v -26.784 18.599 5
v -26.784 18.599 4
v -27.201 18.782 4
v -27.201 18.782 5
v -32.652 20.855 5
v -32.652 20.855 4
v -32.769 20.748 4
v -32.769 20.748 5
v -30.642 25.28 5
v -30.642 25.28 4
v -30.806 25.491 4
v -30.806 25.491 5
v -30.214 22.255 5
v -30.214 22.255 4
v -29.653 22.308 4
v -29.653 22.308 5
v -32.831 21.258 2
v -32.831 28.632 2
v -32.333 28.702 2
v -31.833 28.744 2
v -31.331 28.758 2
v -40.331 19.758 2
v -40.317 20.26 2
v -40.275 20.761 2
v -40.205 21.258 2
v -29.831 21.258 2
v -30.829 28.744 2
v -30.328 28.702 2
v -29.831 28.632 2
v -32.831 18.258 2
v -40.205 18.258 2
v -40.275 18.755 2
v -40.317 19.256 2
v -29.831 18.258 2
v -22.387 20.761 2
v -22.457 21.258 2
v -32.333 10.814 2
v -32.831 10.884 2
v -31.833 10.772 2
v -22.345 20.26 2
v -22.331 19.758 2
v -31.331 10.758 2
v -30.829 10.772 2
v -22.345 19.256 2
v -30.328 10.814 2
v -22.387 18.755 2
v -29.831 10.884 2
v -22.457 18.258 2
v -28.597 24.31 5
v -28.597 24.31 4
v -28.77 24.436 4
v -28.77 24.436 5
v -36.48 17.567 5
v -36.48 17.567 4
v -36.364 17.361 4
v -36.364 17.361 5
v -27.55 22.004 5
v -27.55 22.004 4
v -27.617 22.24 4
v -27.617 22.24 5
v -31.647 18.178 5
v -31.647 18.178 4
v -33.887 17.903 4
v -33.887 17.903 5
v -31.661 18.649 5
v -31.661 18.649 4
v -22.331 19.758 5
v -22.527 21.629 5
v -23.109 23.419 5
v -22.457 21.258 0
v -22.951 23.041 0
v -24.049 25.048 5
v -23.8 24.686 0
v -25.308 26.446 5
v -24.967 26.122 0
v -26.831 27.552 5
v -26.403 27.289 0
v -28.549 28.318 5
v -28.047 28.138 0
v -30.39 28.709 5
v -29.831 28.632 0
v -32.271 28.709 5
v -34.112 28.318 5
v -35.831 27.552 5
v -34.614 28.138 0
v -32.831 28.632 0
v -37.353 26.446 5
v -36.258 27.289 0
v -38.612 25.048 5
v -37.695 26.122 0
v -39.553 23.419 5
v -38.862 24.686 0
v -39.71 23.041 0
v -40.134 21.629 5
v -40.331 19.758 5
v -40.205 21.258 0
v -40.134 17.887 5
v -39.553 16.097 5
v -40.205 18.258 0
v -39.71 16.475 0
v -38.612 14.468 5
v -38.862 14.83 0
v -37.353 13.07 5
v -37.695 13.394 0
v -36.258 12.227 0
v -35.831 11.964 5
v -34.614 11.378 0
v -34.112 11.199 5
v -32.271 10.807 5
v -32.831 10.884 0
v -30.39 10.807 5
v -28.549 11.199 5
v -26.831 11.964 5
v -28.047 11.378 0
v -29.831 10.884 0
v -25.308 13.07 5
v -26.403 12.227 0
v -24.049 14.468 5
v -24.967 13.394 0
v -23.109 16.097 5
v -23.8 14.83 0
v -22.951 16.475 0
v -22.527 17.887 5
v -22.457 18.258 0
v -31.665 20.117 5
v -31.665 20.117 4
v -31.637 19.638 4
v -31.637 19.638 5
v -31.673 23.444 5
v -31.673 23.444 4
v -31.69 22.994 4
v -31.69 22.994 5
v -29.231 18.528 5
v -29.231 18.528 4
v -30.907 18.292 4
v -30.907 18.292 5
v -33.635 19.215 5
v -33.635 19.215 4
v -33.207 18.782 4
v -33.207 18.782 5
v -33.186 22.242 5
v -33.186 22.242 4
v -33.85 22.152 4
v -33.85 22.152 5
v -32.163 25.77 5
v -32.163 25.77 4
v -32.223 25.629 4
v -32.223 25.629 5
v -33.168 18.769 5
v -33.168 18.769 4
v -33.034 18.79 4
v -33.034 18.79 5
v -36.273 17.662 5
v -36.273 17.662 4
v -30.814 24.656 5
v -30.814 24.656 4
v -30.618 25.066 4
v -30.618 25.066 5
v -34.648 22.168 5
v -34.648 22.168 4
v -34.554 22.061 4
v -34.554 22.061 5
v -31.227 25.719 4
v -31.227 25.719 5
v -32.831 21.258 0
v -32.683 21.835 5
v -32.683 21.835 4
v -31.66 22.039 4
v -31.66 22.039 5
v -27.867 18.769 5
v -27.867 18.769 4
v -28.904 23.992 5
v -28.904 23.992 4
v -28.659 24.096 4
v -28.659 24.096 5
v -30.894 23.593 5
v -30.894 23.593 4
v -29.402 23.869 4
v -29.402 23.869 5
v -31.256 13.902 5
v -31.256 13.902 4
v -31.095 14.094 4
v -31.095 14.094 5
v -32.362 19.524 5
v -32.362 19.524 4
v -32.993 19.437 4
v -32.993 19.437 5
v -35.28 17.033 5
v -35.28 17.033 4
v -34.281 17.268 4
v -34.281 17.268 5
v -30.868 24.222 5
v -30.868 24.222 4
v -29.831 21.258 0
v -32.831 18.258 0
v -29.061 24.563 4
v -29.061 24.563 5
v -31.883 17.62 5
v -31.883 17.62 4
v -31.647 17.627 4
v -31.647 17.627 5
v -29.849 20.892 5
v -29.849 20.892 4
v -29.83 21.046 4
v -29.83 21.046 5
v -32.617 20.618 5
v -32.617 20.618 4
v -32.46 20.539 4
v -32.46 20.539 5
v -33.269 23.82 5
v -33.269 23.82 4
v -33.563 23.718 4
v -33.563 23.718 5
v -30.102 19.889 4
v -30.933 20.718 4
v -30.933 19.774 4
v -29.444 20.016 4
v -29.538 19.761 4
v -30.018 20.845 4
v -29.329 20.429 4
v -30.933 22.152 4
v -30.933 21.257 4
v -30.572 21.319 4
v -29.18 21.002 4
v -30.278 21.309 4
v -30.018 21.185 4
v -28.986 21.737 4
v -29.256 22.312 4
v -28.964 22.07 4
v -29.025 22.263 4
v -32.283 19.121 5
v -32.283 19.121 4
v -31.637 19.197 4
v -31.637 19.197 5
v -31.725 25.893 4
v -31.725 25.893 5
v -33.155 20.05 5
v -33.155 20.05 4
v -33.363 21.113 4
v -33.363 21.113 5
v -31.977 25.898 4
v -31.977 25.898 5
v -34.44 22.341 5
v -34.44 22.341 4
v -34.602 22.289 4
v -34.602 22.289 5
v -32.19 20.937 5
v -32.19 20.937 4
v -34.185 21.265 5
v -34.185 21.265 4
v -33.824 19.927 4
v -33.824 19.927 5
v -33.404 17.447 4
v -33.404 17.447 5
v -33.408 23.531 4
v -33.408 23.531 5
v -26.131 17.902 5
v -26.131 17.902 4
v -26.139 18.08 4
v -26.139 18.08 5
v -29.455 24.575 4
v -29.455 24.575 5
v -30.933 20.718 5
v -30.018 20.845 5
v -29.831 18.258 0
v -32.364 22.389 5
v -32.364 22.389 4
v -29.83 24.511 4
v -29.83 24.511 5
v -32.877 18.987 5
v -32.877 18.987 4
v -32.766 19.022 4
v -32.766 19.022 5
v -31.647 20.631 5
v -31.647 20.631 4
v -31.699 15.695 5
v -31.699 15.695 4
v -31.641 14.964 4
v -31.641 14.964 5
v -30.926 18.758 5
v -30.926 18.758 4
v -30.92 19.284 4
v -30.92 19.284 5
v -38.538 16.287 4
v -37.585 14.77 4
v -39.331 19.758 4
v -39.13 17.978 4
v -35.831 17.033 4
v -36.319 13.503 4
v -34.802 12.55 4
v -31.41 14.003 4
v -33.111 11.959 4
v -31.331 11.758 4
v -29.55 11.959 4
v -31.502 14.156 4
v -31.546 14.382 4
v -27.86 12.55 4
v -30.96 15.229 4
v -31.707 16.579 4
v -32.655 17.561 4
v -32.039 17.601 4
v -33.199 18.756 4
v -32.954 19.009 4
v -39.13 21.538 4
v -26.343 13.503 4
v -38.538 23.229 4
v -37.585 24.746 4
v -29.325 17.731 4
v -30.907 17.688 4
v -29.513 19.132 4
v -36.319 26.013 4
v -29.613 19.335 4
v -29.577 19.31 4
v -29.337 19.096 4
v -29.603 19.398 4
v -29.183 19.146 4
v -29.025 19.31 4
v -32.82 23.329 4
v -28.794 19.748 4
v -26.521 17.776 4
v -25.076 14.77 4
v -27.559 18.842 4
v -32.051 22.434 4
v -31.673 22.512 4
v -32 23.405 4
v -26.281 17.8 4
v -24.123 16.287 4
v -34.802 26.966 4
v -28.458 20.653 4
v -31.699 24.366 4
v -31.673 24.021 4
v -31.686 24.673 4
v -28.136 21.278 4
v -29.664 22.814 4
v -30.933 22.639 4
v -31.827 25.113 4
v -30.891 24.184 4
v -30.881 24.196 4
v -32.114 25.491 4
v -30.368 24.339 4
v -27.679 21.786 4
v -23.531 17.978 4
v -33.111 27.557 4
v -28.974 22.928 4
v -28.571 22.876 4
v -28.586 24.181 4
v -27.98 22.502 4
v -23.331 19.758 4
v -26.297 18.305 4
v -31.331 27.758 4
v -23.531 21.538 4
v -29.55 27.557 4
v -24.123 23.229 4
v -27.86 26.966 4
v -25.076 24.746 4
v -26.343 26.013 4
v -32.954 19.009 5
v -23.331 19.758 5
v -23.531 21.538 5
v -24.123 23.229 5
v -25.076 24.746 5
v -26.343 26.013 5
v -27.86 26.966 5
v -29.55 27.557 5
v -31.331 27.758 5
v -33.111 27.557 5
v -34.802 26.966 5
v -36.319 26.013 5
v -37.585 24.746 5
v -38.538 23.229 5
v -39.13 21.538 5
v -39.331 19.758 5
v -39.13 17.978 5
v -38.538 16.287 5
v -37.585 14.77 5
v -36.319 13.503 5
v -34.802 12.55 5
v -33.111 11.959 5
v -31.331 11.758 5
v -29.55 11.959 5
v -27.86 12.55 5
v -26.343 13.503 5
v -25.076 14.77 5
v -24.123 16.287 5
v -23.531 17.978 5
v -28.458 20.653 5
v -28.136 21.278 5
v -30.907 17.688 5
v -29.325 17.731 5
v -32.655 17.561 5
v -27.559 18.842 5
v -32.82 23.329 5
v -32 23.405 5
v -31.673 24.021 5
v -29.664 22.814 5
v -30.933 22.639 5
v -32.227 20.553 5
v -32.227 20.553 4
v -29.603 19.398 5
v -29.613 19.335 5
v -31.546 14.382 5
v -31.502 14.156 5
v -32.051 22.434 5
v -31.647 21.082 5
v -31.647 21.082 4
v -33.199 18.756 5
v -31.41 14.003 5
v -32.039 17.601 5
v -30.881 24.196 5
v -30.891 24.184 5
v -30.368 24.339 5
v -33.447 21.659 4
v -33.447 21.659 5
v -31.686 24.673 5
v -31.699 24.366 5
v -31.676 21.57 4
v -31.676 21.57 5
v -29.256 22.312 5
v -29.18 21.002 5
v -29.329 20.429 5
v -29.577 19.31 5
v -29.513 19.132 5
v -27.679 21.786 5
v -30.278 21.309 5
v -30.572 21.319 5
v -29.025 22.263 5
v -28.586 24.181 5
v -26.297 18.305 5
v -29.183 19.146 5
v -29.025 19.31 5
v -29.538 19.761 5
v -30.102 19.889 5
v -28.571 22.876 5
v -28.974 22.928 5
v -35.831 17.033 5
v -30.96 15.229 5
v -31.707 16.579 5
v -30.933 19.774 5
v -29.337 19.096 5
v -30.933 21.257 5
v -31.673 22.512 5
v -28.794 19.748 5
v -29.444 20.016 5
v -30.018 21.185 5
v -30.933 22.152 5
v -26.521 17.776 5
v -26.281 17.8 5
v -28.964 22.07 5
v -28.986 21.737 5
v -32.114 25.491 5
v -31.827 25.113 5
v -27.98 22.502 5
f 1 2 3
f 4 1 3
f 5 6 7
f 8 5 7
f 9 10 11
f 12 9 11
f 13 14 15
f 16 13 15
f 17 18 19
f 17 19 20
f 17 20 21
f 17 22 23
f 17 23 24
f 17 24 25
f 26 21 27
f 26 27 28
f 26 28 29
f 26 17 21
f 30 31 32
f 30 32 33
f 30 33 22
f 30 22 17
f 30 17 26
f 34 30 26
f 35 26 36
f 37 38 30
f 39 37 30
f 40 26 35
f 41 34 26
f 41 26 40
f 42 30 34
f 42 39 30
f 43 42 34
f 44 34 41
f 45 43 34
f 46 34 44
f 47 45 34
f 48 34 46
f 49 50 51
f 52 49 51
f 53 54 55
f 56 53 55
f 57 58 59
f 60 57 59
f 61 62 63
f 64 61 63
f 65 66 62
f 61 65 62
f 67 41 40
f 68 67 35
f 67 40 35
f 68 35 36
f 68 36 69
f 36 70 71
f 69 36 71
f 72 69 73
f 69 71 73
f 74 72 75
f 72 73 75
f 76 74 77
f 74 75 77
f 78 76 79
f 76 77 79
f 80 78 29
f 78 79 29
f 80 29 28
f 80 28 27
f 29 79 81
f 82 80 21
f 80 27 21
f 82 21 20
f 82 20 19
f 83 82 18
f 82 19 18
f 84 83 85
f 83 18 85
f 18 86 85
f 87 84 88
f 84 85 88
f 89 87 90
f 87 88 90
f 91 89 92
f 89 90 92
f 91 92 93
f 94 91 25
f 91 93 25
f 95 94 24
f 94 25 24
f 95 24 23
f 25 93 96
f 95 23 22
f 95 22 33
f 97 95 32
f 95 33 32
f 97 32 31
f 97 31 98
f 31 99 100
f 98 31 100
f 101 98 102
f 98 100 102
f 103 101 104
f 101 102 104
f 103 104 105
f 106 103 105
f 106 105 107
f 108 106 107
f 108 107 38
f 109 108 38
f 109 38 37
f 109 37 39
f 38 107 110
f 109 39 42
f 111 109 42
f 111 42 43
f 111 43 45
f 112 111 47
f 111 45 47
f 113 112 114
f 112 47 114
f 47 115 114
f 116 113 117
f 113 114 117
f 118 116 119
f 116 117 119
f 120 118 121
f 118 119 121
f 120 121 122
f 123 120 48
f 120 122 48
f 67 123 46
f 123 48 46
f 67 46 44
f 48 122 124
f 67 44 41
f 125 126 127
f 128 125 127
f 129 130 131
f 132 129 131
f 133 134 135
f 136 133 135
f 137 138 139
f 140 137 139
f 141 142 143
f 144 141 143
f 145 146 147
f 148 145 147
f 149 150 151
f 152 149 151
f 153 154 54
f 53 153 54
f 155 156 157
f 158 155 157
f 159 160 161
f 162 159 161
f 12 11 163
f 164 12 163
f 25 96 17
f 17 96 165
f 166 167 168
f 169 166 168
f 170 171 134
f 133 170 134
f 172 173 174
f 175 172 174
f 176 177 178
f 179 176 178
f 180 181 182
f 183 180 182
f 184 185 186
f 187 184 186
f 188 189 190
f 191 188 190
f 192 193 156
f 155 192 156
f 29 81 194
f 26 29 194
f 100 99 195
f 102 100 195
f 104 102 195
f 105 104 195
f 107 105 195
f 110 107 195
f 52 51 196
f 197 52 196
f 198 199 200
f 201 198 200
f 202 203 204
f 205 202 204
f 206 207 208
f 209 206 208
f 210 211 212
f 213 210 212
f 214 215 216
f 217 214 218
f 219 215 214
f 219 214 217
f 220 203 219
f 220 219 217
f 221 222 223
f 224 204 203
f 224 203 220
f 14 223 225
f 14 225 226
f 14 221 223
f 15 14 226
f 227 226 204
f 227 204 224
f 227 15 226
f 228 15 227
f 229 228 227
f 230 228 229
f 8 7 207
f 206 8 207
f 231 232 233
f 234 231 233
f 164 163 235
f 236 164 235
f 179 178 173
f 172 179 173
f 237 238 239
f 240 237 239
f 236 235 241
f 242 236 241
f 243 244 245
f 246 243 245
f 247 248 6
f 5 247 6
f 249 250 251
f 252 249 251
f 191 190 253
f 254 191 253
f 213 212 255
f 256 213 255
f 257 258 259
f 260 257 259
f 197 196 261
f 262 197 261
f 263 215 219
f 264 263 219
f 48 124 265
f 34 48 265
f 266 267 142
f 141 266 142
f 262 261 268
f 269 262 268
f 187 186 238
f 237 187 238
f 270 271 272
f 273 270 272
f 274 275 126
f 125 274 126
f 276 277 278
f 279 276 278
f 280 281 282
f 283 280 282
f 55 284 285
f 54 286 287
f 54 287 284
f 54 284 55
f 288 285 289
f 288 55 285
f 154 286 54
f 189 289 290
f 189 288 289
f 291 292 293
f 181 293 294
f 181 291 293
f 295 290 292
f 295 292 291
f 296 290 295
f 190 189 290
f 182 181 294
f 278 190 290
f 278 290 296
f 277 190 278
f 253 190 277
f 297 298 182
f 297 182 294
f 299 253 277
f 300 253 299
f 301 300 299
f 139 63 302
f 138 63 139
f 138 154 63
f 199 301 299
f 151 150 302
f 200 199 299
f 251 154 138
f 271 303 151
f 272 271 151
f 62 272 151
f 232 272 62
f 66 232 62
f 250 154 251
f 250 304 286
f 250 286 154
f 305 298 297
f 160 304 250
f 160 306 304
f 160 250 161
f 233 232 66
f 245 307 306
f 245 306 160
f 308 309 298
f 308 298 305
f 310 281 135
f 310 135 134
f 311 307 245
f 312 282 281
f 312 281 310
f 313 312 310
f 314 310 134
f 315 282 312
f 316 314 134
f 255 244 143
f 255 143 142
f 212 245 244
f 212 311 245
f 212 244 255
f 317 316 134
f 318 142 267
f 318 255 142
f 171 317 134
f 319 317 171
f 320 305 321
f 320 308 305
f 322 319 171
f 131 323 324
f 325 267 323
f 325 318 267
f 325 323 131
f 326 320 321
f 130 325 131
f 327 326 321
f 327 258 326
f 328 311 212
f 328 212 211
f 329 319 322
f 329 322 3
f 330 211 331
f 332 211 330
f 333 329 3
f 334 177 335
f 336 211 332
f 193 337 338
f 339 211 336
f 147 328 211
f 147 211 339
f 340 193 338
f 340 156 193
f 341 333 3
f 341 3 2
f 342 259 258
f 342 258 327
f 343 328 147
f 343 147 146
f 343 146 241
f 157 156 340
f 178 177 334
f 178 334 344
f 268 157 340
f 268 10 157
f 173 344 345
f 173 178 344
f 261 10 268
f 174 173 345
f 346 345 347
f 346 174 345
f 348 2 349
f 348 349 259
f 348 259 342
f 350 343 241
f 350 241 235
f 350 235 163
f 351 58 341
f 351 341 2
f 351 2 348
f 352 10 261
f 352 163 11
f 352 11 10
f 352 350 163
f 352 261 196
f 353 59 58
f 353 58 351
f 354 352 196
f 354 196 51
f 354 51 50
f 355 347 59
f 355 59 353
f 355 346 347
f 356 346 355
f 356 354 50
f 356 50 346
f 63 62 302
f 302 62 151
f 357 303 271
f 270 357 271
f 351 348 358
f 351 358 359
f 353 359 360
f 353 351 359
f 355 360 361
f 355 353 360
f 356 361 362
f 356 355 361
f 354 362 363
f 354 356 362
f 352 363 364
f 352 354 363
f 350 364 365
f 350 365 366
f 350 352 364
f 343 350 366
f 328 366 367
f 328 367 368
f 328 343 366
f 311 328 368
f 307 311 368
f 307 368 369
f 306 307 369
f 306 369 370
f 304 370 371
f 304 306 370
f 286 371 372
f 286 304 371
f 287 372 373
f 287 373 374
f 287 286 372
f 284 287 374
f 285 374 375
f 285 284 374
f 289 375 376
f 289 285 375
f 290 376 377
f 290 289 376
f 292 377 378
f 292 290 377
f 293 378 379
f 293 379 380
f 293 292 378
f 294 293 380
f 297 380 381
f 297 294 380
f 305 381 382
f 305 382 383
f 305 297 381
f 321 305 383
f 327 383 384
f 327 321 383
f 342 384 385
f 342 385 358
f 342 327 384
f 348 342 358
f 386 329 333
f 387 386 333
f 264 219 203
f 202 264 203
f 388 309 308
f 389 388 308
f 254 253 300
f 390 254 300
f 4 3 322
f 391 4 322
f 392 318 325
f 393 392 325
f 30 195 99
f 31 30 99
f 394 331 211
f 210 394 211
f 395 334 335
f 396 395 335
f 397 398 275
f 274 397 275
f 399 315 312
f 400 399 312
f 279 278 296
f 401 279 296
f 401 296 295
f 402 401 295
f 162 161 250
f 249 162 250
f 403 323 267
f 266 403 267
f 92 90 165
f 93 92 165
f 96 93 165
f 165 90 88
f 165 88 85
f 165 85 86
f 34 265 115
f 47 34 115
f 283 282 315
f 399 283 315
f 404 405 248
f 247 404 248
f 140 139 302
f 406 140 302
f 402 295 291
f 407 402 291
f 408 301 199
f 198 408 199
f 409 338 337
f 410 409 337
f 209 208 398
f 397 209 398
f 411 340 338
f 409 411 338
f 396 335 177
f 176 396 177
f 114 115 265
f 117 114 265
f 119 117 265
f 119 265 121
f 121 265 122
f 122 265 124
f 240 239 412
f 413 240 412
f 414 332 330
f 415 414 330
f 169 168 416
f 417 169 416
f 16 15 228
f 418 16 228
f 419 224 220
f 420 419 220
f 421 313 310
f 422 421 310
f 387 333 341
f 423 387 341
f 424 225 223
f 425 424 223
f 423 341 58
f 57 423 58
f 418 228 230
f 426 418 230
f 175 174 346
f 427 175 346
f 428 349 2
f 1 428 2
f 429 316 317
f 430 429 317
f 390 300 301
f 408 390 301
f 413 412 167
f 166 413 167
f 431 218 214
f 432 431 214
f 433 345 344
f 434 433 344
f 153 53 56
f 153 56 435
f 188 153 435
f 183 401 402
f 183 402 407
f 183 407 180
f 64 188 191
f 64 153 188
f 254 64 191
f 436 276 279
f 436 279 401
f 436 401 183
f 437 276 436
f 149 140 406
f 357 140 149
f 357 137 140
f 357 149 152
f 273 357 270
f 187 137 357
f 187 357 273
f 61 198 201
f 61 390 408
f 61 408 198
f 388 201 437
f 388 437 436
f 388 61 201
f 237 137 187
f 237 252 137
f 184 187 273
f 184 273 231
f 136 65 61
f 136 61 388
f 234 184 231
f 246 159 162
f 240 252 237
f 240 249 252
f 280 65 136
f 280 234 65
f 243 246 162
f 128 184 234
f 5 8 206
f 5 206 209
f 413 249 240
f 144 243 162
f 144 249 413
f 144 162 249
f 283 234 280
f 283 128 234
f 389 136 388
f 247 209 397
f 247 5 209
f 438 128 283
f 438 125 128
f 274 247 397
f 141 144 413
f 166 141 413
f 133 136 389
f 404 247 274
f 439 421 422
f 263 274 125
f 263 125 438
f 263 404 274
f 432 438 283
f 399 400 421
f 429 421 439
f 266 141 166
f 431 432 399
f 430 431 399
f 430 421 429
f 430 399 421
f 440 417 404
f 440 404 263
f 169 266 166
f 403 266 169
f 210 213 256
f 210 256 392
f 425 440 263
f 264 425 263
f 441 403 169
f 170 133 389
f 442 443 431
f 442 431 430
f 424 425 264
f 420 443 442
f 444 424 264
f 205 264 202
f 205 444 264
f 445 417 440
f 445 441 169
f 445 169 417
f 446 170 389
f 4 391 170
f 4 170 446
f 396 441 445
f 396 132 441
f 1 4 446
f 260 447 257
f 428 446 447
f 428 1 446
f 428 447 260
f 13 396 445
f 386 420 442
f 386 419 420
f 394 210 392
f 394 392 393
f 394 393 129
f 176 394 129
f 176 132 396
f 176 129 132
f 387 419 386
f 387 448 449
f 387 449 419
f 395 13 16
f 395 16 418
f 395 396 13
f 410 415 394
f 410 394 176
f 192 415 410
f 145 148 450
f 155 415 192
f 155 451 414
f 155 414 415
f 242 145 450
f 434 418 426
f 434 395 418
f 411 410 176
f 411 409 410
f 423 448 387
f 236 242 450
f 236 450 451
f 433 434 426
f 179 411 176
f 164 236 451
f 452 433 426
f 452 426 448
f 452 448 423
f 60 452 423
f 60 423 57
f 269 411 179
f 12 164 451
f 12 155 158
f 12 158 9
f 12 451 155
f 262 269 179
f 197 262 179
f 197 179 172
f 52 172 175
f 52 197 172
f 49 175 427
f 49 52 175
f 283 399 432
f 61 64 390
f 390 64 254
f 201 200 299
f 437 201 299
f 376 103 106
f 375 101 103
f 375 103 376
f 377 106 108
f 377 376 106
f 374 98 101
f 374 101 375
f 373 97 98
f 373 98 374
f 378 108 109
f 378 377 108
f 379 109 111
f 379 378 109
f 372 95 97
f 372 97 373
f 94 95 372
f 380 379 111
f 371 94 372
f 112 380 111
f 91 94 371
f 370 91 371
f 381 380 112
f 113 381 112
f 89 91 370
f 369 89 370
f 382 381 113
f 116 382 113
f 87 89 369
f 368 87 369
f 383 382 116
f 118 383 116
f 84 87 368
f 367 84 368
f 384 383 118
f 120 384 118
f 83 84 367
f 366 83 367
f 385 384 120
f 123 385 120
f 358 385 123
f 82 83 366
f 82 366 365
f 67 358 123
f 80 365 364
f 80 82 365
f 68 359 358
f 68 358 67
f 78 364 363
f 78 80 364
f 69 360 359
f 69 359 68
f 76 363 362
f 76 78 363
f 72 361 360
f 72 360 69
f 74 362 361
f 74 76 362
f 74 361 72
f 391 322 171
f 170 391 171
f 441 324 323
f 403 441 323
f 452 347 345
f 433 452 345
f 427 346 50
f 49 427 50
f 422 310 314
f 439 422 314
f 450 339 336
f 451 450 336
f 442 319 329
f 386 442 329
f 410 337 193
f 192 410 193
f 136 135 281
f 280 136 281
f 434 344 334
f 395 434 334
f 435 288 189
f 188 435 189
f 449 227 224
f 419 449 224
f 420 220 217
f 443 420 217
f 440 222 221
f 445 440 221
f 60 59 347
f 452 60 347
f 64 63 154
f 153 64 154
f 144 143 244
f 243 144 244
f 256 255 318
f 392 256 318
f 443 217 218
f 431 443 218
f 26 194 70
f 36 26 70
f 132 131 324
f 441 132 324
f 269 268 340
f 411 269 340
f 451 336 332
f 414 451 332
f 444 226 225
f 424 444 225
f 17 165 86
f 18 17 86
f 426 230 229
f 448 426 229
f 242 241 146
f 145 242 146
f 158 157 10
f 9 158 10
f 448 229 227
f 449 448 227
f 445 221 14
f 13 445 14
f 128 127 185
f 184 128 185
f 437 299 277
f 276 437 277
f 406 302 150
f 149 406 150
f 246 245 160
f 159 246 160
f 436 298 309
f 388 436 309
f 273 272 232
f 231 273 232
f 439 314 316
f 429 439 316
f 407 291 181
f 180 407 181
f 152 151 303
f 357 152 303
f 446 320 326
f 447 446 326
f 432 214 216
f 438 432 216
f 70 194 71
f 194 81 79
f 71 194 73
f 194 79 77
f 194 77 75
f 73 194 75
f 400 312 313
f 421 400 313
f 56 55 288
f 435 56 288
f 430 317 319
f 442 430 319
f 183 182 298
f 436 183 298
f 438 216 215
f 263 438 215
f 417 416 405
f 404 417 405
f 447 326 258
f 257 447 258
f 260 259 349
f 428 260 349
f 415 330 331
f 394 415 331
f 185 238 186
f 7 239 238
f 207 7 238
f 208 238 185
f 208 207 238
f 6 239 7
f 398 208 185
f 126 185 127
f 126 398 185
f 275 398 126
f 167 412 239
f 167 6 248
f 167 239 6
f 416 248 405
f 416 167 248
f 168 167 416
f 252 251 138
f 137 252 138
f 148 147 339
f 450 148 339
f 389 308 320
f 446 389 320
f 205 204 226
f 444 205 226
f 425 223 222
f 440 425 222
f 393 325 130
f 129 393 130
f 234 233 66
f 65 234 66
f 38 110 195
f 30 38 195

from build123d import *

# Parameters (mm, degrees)
F0_R     = 9
F1_DEPTH = 4
F3_W     = 3
F3_H     = 3
F4_DEPTH = 2
F2_R     = 9
F2_R_2   = 8
F5_DEPTH = 1
F7_DEPTH = 1


# Not quite as in the source:
# - a feature names something its author has since deleted; it is built from what else it names


with BuildPart() as f1:
    # F0 (on Top) → F1 (new body)
    with BuildSketch(Plane.XY):
        with Locations((-31.3306450844, 19.7580661625)):
            Circle(F0_R)
    extrude(amount=F1_DEPTH)

    # F3 (on face) → F4 (cut)
    with BuildSketch(Plane(origin=(0, 0, 0), x_dir=(1, 0, 0), z_dir=(0, 0, -1))):
        with BuildLine():
            ThreePointArc((-32.8306450844, -28.6321858371), (-32.0832814269, -28.7265408676), (-31.3306450844, -28.7580661625))
            ThreePointArc((-31.3306450844, -28.7580661625), (-30.5780087419, -28.7265408676), (-29.8306450844, -28.6321858371))
            Line((-29.8306450844, -28.6321858371), (-29.8306450844, -21.2580661625))
            Line((-29.8306450844, -21.2580661625), (-32.8306450844, -21.2580661625))
            Line((-32.8306450844, -21.2580661625), (-32.8306450844, -28.6321858371))
        make_face()
        with BuildLine():
            ThreePointArc((-40.204764759, -18.2580661625), (-40.2991197895, -19.0054298199), (-40.3306450844, -19.7580661625))
            ThreePointArc((-40.3306450844, -19.7580661625), (-40.2991197895, -20.510702505), (-40.204764759, -21.2580661625))
            Line((-40.204764759, -21.2580661625), (-32.8306450844, -21.2580661625))
            Line((-32.8306450844, -21.2580661625), (-32.8306450844, -18.2580661625))
            Line((-32.8306450844, -18.2580661625), (-40.204764759, -18.2580661625))
        make_face()
        with Locations((-31.3306450844, -19.7580661625)):
            Rectangle(F3_W, F3_H)
        with BuildLine():
            Line((-29.8306450844, -18.2580661625), (-29.8306450844, -21.2580661625))
            Line((-29.8306450844, -21.2580661625), (-22.4565254097, -21.2580661625))
            ThreePointArc((-22.4565254097, -21.2580661625), (-22.3621703793, -20.510702505), (-22.3306450844, -19.7580661625))
            ThreePointArc((-22.3306450844, -19.7580661625), (-22.3621703793, -19.0054298199), (-22.4565254097, -18.2580661625))
            Line((-22.4565254097, -18.2580661625), (-29.8306450844, -18.2580661625))
        make_face()
        with BuildLine():
            Line((-32.8306450844, -10.8839464878), (-32.8306450844, -18.2580661625))
            Line((-32.8306450844, -18.2580661625), (-29.8306450844, -18.2580661625))
            Line((-29.8306450844, -18.2580661625), (-29.8306450844, -10.8839464878))
            ThreePointArc((-29.8306450844, -10.8839464878), (-30.5780087419, -10.7895914574), (-31.3306450844, -10.7580661625))
            ThreePointArc((-31.3306450844, -10.7580661625), (-32.0832814269, -10.7895914574), (-32.8306450844, -10.8839464878))
        make_face()
    extrude(amount=-F4_DEPTH, mode=Mode.SUBTRACT)

    # F2 (on face) → F5 (join)
    with BuildSketch(Plane.XY.offset(4)):
        with Locations((-31.3306450844, 19.7580661625)):
            Circle(F2_R)
        with Locations((-31.3306450844, 19.7580661625)):
            Circle(F2_R_2, mode=Mode.SUBTRACT)
    extrude(amount=F5_DEPTH)

    # F6 (on face) → F7 (join)
    with BuildSketch(Plane.XY.offset(4)):
        Polygon((-31.8826989997, 17.620101061), (-31.6466835645, 17.6265811855), (-31.7066879875, 16.579484876), (-31.6994015259, 15.6946153355), (-31.6409921199, 14.9638444516), (-31.5461033208, 14.3823088935), (-31.5023139233, 14.1560195308), (-31.4098559066, 14.0027283885), (-31.2557513645, 13.9021557962), (-31.0951431551, 14.0935678455), (-30.9597079636, 15.2290645897), (-30.9069900022, 17.6882277109), (-29.3254158456, 17.7312048856), (-26.5207167102, 17.7758241628), (-26.2806401616, 17.8001378726), (-26.131438384, 17.902336676), (-26.1387366169, 18.0799662479), (-26.2968846155, 18.3046282224), (-26.7843359457, 18.5990530635), (-27.2012180722, 18.7815383146), (-27.5588903414, 18.842378503), (-27.8670641117, 18.7685604085), (-29.2313039551, 18.5276657515), (-30.9069900022, 18.2916503163), (-30.9264421472, 18.7580132848), (-30.9199620226, 19.2844101047), (-29.6028075528, 19.3979623688), (-29.6133429052, 19.3346972837), (-29.5768517406, 19.3103600312), (-29.5127567758, 19.1319241223), (-29.336775192, 19.0962275234), (-29.1826294501, 19.1457083654), (-29.0253054456, 19.3103600312), (-28.7941751179, 19.7483540621), (-28.4575735534, 20.6534526562), (-28.1363924487, 21.2779812803), (-27.6789580441, 21.7857381779), (-27.5499441205, 22.0039200278), (-27.6172762047, 22.239935463), (-27.9798335815, 22.5019067104), (-28.5711081605, 22.8758234335), (-28.9742178152, 22.9277350579), (-29.6644305355, 22.8142004508), (-30.9329399287, 22.6389840043), (-30.8940120961, 23.59281596), (-29.4016352941, 23.8685596792), (-28.9044726056, 23.9918645013), (-28.6586869554, 24.0956877501), (-28.5857046263, 24.1807945629), (-28.5970639727, 24.3098084866), (-28.7698084371, 24.4362915714), (-29.0609726161, 24.562833513), (-29.4551949066, 24.5750168534), (-29.829876767, 24.5109218886), (-30.3684157276, 24.3390014182), (-30.88103419, 24.1962150228), (-30.890769091, 24.1840316823), (-30.8680562839, 24.222170835), (-30.8137197628, 24.6561214094), (-30.6182036345, 25.065705303), (-30.6417463214, 25.2798260395), (-30.8064097585, 25.4907096565), (-31.2273471128, 25.7194268588), (-31.7245451154, 25.8929953172), (-31.9767755761, 25.897821568), (-32.162527375, 25.7696904951), (-32.222531798, 25.6293760818), (-32.1138587557, 25.4907096565), (-31.8267439188, 25.1127318199), (-31.6856113971, 24.6731310006), (-31.6985893032, 24.3657223677), (-31.672633491, 24.021057433), (-33.2688158848, 23.8198851742), (-33.5632230689, 23.7177099135), (-33.4083239611, 23.5311341206), (-32.8202865015, 23.3291967246), (-32.0003006059, 23.4046510358), (-31.672633491, 23.4435553257), (-31.6904729619, 22.9942431481), (-31.672633491, 22.5124420627), (-32.0514000076, 22.4338094888), (-32.363658434, 22.3891960973), (-33.186075112, 22.2423485884), (-33.8495492258, 22.1523566681), (-34.4399939251, 22.3405215924), (-34.6022089228, 22.288609968), (-34.648440874, 22.167777128), (-34.5535461892, 22.0614818971), (-34.1845028022, 21.2650328026), (-33.8235934136, 19.9267487714), (-33.6346044953, 19.2146413523), (-33.2071693594, 18.7815383146), (-33.1990530181, 18.7555883881), (-33.1682415268, 18.7685604085), (-33.0336126723, 18.7896605415), (-32.954109019, 19.0086487285), (-32.8770773478, 18.9867422584), (-32.7659499804, 19.0216266346), (-32.2825597636, 19.1213711129), (-31.6369427778, 19.1968077671), (-31.6612800303, 18.6485280198), (-31.6466835645, 18.1781157092), (-33.8868408417, 17.9031488987), (-36.2730075081, 17.6622718987), (-36.4798311888, 17.5673595569), (-36.3638475537, 17.360560596), (-35.8309782607, 17.0328699384), (-35.2802618454, 17.0328699384), (-34.2810337038, 17.2680790366), (-33.4042569619, 17.4465208312), (-32.654822613, 17.560885318), (-32.0392343242, 17.6006253733), align=None)
        Polygon((-31.6758764961, 21.5699694534), (-31.6466835645, 21.0817529858), (-32.1901017469, 20.936553465), (-32.6523977163, 20.8546249149), (-32.7691870998, 20.7483885407), (-32.6167011174, 20.6177854857), (-32.4601716785, 20.5391529118), (-32.2273933628, 20.5529253835), (-31.6466835645, 20.6307928201), (-31.6653293724, 20.1173856777), (-31.6369427778, 19.6380271461), (-32.3620398743, 19.524474882), (-32.9930603943, 19.4368960871), (-33.1552636207, 20.0500535935), (-33.3628983469, 21.1125350488), (-33.4472400224, 21.6591962363), (-32.6832268646, 21.8351778202), (-31.6596614706, 22.0387632043), align=None, mode=Mode.SUBTRACT)
        Polygon((-30.9329399287, 19.7743098743), (-30.9329399287, 20.718371615), (-30.0180416913, 20.8449135566), (-29.8485343463, 20.8919400735), (-29.829876767, 21.0460269586), (-30.0180416913, 21.1847522406), (-30.2775998133, 21.3088222), (-30.5720011117, 21.318592415), (-30.9329399287, 21.2569105756), (-30.9329399287, 22.1523566681), (-30.2143288425, 22.2545319288), (-29.6530711891, 22.3080915413), (-29.2556706359, 22.3120937981), (-29.0253054456, 22.2626541558), (-28.9636824629, 22.070428118), (-28.9864011556, 21.7370636729), (-29.1802163247, 21.0022375611), (-29.328652965, 20.4287965674), (-29.4438355602, 20.0159755543), (-29.537888594, 19.7613025399), (-30.1016182294, 19.8886684755), align=None, mode=Mode.SUBTRACT)
    extrude(amount=F7_DEPTH)


solid = f1.part
